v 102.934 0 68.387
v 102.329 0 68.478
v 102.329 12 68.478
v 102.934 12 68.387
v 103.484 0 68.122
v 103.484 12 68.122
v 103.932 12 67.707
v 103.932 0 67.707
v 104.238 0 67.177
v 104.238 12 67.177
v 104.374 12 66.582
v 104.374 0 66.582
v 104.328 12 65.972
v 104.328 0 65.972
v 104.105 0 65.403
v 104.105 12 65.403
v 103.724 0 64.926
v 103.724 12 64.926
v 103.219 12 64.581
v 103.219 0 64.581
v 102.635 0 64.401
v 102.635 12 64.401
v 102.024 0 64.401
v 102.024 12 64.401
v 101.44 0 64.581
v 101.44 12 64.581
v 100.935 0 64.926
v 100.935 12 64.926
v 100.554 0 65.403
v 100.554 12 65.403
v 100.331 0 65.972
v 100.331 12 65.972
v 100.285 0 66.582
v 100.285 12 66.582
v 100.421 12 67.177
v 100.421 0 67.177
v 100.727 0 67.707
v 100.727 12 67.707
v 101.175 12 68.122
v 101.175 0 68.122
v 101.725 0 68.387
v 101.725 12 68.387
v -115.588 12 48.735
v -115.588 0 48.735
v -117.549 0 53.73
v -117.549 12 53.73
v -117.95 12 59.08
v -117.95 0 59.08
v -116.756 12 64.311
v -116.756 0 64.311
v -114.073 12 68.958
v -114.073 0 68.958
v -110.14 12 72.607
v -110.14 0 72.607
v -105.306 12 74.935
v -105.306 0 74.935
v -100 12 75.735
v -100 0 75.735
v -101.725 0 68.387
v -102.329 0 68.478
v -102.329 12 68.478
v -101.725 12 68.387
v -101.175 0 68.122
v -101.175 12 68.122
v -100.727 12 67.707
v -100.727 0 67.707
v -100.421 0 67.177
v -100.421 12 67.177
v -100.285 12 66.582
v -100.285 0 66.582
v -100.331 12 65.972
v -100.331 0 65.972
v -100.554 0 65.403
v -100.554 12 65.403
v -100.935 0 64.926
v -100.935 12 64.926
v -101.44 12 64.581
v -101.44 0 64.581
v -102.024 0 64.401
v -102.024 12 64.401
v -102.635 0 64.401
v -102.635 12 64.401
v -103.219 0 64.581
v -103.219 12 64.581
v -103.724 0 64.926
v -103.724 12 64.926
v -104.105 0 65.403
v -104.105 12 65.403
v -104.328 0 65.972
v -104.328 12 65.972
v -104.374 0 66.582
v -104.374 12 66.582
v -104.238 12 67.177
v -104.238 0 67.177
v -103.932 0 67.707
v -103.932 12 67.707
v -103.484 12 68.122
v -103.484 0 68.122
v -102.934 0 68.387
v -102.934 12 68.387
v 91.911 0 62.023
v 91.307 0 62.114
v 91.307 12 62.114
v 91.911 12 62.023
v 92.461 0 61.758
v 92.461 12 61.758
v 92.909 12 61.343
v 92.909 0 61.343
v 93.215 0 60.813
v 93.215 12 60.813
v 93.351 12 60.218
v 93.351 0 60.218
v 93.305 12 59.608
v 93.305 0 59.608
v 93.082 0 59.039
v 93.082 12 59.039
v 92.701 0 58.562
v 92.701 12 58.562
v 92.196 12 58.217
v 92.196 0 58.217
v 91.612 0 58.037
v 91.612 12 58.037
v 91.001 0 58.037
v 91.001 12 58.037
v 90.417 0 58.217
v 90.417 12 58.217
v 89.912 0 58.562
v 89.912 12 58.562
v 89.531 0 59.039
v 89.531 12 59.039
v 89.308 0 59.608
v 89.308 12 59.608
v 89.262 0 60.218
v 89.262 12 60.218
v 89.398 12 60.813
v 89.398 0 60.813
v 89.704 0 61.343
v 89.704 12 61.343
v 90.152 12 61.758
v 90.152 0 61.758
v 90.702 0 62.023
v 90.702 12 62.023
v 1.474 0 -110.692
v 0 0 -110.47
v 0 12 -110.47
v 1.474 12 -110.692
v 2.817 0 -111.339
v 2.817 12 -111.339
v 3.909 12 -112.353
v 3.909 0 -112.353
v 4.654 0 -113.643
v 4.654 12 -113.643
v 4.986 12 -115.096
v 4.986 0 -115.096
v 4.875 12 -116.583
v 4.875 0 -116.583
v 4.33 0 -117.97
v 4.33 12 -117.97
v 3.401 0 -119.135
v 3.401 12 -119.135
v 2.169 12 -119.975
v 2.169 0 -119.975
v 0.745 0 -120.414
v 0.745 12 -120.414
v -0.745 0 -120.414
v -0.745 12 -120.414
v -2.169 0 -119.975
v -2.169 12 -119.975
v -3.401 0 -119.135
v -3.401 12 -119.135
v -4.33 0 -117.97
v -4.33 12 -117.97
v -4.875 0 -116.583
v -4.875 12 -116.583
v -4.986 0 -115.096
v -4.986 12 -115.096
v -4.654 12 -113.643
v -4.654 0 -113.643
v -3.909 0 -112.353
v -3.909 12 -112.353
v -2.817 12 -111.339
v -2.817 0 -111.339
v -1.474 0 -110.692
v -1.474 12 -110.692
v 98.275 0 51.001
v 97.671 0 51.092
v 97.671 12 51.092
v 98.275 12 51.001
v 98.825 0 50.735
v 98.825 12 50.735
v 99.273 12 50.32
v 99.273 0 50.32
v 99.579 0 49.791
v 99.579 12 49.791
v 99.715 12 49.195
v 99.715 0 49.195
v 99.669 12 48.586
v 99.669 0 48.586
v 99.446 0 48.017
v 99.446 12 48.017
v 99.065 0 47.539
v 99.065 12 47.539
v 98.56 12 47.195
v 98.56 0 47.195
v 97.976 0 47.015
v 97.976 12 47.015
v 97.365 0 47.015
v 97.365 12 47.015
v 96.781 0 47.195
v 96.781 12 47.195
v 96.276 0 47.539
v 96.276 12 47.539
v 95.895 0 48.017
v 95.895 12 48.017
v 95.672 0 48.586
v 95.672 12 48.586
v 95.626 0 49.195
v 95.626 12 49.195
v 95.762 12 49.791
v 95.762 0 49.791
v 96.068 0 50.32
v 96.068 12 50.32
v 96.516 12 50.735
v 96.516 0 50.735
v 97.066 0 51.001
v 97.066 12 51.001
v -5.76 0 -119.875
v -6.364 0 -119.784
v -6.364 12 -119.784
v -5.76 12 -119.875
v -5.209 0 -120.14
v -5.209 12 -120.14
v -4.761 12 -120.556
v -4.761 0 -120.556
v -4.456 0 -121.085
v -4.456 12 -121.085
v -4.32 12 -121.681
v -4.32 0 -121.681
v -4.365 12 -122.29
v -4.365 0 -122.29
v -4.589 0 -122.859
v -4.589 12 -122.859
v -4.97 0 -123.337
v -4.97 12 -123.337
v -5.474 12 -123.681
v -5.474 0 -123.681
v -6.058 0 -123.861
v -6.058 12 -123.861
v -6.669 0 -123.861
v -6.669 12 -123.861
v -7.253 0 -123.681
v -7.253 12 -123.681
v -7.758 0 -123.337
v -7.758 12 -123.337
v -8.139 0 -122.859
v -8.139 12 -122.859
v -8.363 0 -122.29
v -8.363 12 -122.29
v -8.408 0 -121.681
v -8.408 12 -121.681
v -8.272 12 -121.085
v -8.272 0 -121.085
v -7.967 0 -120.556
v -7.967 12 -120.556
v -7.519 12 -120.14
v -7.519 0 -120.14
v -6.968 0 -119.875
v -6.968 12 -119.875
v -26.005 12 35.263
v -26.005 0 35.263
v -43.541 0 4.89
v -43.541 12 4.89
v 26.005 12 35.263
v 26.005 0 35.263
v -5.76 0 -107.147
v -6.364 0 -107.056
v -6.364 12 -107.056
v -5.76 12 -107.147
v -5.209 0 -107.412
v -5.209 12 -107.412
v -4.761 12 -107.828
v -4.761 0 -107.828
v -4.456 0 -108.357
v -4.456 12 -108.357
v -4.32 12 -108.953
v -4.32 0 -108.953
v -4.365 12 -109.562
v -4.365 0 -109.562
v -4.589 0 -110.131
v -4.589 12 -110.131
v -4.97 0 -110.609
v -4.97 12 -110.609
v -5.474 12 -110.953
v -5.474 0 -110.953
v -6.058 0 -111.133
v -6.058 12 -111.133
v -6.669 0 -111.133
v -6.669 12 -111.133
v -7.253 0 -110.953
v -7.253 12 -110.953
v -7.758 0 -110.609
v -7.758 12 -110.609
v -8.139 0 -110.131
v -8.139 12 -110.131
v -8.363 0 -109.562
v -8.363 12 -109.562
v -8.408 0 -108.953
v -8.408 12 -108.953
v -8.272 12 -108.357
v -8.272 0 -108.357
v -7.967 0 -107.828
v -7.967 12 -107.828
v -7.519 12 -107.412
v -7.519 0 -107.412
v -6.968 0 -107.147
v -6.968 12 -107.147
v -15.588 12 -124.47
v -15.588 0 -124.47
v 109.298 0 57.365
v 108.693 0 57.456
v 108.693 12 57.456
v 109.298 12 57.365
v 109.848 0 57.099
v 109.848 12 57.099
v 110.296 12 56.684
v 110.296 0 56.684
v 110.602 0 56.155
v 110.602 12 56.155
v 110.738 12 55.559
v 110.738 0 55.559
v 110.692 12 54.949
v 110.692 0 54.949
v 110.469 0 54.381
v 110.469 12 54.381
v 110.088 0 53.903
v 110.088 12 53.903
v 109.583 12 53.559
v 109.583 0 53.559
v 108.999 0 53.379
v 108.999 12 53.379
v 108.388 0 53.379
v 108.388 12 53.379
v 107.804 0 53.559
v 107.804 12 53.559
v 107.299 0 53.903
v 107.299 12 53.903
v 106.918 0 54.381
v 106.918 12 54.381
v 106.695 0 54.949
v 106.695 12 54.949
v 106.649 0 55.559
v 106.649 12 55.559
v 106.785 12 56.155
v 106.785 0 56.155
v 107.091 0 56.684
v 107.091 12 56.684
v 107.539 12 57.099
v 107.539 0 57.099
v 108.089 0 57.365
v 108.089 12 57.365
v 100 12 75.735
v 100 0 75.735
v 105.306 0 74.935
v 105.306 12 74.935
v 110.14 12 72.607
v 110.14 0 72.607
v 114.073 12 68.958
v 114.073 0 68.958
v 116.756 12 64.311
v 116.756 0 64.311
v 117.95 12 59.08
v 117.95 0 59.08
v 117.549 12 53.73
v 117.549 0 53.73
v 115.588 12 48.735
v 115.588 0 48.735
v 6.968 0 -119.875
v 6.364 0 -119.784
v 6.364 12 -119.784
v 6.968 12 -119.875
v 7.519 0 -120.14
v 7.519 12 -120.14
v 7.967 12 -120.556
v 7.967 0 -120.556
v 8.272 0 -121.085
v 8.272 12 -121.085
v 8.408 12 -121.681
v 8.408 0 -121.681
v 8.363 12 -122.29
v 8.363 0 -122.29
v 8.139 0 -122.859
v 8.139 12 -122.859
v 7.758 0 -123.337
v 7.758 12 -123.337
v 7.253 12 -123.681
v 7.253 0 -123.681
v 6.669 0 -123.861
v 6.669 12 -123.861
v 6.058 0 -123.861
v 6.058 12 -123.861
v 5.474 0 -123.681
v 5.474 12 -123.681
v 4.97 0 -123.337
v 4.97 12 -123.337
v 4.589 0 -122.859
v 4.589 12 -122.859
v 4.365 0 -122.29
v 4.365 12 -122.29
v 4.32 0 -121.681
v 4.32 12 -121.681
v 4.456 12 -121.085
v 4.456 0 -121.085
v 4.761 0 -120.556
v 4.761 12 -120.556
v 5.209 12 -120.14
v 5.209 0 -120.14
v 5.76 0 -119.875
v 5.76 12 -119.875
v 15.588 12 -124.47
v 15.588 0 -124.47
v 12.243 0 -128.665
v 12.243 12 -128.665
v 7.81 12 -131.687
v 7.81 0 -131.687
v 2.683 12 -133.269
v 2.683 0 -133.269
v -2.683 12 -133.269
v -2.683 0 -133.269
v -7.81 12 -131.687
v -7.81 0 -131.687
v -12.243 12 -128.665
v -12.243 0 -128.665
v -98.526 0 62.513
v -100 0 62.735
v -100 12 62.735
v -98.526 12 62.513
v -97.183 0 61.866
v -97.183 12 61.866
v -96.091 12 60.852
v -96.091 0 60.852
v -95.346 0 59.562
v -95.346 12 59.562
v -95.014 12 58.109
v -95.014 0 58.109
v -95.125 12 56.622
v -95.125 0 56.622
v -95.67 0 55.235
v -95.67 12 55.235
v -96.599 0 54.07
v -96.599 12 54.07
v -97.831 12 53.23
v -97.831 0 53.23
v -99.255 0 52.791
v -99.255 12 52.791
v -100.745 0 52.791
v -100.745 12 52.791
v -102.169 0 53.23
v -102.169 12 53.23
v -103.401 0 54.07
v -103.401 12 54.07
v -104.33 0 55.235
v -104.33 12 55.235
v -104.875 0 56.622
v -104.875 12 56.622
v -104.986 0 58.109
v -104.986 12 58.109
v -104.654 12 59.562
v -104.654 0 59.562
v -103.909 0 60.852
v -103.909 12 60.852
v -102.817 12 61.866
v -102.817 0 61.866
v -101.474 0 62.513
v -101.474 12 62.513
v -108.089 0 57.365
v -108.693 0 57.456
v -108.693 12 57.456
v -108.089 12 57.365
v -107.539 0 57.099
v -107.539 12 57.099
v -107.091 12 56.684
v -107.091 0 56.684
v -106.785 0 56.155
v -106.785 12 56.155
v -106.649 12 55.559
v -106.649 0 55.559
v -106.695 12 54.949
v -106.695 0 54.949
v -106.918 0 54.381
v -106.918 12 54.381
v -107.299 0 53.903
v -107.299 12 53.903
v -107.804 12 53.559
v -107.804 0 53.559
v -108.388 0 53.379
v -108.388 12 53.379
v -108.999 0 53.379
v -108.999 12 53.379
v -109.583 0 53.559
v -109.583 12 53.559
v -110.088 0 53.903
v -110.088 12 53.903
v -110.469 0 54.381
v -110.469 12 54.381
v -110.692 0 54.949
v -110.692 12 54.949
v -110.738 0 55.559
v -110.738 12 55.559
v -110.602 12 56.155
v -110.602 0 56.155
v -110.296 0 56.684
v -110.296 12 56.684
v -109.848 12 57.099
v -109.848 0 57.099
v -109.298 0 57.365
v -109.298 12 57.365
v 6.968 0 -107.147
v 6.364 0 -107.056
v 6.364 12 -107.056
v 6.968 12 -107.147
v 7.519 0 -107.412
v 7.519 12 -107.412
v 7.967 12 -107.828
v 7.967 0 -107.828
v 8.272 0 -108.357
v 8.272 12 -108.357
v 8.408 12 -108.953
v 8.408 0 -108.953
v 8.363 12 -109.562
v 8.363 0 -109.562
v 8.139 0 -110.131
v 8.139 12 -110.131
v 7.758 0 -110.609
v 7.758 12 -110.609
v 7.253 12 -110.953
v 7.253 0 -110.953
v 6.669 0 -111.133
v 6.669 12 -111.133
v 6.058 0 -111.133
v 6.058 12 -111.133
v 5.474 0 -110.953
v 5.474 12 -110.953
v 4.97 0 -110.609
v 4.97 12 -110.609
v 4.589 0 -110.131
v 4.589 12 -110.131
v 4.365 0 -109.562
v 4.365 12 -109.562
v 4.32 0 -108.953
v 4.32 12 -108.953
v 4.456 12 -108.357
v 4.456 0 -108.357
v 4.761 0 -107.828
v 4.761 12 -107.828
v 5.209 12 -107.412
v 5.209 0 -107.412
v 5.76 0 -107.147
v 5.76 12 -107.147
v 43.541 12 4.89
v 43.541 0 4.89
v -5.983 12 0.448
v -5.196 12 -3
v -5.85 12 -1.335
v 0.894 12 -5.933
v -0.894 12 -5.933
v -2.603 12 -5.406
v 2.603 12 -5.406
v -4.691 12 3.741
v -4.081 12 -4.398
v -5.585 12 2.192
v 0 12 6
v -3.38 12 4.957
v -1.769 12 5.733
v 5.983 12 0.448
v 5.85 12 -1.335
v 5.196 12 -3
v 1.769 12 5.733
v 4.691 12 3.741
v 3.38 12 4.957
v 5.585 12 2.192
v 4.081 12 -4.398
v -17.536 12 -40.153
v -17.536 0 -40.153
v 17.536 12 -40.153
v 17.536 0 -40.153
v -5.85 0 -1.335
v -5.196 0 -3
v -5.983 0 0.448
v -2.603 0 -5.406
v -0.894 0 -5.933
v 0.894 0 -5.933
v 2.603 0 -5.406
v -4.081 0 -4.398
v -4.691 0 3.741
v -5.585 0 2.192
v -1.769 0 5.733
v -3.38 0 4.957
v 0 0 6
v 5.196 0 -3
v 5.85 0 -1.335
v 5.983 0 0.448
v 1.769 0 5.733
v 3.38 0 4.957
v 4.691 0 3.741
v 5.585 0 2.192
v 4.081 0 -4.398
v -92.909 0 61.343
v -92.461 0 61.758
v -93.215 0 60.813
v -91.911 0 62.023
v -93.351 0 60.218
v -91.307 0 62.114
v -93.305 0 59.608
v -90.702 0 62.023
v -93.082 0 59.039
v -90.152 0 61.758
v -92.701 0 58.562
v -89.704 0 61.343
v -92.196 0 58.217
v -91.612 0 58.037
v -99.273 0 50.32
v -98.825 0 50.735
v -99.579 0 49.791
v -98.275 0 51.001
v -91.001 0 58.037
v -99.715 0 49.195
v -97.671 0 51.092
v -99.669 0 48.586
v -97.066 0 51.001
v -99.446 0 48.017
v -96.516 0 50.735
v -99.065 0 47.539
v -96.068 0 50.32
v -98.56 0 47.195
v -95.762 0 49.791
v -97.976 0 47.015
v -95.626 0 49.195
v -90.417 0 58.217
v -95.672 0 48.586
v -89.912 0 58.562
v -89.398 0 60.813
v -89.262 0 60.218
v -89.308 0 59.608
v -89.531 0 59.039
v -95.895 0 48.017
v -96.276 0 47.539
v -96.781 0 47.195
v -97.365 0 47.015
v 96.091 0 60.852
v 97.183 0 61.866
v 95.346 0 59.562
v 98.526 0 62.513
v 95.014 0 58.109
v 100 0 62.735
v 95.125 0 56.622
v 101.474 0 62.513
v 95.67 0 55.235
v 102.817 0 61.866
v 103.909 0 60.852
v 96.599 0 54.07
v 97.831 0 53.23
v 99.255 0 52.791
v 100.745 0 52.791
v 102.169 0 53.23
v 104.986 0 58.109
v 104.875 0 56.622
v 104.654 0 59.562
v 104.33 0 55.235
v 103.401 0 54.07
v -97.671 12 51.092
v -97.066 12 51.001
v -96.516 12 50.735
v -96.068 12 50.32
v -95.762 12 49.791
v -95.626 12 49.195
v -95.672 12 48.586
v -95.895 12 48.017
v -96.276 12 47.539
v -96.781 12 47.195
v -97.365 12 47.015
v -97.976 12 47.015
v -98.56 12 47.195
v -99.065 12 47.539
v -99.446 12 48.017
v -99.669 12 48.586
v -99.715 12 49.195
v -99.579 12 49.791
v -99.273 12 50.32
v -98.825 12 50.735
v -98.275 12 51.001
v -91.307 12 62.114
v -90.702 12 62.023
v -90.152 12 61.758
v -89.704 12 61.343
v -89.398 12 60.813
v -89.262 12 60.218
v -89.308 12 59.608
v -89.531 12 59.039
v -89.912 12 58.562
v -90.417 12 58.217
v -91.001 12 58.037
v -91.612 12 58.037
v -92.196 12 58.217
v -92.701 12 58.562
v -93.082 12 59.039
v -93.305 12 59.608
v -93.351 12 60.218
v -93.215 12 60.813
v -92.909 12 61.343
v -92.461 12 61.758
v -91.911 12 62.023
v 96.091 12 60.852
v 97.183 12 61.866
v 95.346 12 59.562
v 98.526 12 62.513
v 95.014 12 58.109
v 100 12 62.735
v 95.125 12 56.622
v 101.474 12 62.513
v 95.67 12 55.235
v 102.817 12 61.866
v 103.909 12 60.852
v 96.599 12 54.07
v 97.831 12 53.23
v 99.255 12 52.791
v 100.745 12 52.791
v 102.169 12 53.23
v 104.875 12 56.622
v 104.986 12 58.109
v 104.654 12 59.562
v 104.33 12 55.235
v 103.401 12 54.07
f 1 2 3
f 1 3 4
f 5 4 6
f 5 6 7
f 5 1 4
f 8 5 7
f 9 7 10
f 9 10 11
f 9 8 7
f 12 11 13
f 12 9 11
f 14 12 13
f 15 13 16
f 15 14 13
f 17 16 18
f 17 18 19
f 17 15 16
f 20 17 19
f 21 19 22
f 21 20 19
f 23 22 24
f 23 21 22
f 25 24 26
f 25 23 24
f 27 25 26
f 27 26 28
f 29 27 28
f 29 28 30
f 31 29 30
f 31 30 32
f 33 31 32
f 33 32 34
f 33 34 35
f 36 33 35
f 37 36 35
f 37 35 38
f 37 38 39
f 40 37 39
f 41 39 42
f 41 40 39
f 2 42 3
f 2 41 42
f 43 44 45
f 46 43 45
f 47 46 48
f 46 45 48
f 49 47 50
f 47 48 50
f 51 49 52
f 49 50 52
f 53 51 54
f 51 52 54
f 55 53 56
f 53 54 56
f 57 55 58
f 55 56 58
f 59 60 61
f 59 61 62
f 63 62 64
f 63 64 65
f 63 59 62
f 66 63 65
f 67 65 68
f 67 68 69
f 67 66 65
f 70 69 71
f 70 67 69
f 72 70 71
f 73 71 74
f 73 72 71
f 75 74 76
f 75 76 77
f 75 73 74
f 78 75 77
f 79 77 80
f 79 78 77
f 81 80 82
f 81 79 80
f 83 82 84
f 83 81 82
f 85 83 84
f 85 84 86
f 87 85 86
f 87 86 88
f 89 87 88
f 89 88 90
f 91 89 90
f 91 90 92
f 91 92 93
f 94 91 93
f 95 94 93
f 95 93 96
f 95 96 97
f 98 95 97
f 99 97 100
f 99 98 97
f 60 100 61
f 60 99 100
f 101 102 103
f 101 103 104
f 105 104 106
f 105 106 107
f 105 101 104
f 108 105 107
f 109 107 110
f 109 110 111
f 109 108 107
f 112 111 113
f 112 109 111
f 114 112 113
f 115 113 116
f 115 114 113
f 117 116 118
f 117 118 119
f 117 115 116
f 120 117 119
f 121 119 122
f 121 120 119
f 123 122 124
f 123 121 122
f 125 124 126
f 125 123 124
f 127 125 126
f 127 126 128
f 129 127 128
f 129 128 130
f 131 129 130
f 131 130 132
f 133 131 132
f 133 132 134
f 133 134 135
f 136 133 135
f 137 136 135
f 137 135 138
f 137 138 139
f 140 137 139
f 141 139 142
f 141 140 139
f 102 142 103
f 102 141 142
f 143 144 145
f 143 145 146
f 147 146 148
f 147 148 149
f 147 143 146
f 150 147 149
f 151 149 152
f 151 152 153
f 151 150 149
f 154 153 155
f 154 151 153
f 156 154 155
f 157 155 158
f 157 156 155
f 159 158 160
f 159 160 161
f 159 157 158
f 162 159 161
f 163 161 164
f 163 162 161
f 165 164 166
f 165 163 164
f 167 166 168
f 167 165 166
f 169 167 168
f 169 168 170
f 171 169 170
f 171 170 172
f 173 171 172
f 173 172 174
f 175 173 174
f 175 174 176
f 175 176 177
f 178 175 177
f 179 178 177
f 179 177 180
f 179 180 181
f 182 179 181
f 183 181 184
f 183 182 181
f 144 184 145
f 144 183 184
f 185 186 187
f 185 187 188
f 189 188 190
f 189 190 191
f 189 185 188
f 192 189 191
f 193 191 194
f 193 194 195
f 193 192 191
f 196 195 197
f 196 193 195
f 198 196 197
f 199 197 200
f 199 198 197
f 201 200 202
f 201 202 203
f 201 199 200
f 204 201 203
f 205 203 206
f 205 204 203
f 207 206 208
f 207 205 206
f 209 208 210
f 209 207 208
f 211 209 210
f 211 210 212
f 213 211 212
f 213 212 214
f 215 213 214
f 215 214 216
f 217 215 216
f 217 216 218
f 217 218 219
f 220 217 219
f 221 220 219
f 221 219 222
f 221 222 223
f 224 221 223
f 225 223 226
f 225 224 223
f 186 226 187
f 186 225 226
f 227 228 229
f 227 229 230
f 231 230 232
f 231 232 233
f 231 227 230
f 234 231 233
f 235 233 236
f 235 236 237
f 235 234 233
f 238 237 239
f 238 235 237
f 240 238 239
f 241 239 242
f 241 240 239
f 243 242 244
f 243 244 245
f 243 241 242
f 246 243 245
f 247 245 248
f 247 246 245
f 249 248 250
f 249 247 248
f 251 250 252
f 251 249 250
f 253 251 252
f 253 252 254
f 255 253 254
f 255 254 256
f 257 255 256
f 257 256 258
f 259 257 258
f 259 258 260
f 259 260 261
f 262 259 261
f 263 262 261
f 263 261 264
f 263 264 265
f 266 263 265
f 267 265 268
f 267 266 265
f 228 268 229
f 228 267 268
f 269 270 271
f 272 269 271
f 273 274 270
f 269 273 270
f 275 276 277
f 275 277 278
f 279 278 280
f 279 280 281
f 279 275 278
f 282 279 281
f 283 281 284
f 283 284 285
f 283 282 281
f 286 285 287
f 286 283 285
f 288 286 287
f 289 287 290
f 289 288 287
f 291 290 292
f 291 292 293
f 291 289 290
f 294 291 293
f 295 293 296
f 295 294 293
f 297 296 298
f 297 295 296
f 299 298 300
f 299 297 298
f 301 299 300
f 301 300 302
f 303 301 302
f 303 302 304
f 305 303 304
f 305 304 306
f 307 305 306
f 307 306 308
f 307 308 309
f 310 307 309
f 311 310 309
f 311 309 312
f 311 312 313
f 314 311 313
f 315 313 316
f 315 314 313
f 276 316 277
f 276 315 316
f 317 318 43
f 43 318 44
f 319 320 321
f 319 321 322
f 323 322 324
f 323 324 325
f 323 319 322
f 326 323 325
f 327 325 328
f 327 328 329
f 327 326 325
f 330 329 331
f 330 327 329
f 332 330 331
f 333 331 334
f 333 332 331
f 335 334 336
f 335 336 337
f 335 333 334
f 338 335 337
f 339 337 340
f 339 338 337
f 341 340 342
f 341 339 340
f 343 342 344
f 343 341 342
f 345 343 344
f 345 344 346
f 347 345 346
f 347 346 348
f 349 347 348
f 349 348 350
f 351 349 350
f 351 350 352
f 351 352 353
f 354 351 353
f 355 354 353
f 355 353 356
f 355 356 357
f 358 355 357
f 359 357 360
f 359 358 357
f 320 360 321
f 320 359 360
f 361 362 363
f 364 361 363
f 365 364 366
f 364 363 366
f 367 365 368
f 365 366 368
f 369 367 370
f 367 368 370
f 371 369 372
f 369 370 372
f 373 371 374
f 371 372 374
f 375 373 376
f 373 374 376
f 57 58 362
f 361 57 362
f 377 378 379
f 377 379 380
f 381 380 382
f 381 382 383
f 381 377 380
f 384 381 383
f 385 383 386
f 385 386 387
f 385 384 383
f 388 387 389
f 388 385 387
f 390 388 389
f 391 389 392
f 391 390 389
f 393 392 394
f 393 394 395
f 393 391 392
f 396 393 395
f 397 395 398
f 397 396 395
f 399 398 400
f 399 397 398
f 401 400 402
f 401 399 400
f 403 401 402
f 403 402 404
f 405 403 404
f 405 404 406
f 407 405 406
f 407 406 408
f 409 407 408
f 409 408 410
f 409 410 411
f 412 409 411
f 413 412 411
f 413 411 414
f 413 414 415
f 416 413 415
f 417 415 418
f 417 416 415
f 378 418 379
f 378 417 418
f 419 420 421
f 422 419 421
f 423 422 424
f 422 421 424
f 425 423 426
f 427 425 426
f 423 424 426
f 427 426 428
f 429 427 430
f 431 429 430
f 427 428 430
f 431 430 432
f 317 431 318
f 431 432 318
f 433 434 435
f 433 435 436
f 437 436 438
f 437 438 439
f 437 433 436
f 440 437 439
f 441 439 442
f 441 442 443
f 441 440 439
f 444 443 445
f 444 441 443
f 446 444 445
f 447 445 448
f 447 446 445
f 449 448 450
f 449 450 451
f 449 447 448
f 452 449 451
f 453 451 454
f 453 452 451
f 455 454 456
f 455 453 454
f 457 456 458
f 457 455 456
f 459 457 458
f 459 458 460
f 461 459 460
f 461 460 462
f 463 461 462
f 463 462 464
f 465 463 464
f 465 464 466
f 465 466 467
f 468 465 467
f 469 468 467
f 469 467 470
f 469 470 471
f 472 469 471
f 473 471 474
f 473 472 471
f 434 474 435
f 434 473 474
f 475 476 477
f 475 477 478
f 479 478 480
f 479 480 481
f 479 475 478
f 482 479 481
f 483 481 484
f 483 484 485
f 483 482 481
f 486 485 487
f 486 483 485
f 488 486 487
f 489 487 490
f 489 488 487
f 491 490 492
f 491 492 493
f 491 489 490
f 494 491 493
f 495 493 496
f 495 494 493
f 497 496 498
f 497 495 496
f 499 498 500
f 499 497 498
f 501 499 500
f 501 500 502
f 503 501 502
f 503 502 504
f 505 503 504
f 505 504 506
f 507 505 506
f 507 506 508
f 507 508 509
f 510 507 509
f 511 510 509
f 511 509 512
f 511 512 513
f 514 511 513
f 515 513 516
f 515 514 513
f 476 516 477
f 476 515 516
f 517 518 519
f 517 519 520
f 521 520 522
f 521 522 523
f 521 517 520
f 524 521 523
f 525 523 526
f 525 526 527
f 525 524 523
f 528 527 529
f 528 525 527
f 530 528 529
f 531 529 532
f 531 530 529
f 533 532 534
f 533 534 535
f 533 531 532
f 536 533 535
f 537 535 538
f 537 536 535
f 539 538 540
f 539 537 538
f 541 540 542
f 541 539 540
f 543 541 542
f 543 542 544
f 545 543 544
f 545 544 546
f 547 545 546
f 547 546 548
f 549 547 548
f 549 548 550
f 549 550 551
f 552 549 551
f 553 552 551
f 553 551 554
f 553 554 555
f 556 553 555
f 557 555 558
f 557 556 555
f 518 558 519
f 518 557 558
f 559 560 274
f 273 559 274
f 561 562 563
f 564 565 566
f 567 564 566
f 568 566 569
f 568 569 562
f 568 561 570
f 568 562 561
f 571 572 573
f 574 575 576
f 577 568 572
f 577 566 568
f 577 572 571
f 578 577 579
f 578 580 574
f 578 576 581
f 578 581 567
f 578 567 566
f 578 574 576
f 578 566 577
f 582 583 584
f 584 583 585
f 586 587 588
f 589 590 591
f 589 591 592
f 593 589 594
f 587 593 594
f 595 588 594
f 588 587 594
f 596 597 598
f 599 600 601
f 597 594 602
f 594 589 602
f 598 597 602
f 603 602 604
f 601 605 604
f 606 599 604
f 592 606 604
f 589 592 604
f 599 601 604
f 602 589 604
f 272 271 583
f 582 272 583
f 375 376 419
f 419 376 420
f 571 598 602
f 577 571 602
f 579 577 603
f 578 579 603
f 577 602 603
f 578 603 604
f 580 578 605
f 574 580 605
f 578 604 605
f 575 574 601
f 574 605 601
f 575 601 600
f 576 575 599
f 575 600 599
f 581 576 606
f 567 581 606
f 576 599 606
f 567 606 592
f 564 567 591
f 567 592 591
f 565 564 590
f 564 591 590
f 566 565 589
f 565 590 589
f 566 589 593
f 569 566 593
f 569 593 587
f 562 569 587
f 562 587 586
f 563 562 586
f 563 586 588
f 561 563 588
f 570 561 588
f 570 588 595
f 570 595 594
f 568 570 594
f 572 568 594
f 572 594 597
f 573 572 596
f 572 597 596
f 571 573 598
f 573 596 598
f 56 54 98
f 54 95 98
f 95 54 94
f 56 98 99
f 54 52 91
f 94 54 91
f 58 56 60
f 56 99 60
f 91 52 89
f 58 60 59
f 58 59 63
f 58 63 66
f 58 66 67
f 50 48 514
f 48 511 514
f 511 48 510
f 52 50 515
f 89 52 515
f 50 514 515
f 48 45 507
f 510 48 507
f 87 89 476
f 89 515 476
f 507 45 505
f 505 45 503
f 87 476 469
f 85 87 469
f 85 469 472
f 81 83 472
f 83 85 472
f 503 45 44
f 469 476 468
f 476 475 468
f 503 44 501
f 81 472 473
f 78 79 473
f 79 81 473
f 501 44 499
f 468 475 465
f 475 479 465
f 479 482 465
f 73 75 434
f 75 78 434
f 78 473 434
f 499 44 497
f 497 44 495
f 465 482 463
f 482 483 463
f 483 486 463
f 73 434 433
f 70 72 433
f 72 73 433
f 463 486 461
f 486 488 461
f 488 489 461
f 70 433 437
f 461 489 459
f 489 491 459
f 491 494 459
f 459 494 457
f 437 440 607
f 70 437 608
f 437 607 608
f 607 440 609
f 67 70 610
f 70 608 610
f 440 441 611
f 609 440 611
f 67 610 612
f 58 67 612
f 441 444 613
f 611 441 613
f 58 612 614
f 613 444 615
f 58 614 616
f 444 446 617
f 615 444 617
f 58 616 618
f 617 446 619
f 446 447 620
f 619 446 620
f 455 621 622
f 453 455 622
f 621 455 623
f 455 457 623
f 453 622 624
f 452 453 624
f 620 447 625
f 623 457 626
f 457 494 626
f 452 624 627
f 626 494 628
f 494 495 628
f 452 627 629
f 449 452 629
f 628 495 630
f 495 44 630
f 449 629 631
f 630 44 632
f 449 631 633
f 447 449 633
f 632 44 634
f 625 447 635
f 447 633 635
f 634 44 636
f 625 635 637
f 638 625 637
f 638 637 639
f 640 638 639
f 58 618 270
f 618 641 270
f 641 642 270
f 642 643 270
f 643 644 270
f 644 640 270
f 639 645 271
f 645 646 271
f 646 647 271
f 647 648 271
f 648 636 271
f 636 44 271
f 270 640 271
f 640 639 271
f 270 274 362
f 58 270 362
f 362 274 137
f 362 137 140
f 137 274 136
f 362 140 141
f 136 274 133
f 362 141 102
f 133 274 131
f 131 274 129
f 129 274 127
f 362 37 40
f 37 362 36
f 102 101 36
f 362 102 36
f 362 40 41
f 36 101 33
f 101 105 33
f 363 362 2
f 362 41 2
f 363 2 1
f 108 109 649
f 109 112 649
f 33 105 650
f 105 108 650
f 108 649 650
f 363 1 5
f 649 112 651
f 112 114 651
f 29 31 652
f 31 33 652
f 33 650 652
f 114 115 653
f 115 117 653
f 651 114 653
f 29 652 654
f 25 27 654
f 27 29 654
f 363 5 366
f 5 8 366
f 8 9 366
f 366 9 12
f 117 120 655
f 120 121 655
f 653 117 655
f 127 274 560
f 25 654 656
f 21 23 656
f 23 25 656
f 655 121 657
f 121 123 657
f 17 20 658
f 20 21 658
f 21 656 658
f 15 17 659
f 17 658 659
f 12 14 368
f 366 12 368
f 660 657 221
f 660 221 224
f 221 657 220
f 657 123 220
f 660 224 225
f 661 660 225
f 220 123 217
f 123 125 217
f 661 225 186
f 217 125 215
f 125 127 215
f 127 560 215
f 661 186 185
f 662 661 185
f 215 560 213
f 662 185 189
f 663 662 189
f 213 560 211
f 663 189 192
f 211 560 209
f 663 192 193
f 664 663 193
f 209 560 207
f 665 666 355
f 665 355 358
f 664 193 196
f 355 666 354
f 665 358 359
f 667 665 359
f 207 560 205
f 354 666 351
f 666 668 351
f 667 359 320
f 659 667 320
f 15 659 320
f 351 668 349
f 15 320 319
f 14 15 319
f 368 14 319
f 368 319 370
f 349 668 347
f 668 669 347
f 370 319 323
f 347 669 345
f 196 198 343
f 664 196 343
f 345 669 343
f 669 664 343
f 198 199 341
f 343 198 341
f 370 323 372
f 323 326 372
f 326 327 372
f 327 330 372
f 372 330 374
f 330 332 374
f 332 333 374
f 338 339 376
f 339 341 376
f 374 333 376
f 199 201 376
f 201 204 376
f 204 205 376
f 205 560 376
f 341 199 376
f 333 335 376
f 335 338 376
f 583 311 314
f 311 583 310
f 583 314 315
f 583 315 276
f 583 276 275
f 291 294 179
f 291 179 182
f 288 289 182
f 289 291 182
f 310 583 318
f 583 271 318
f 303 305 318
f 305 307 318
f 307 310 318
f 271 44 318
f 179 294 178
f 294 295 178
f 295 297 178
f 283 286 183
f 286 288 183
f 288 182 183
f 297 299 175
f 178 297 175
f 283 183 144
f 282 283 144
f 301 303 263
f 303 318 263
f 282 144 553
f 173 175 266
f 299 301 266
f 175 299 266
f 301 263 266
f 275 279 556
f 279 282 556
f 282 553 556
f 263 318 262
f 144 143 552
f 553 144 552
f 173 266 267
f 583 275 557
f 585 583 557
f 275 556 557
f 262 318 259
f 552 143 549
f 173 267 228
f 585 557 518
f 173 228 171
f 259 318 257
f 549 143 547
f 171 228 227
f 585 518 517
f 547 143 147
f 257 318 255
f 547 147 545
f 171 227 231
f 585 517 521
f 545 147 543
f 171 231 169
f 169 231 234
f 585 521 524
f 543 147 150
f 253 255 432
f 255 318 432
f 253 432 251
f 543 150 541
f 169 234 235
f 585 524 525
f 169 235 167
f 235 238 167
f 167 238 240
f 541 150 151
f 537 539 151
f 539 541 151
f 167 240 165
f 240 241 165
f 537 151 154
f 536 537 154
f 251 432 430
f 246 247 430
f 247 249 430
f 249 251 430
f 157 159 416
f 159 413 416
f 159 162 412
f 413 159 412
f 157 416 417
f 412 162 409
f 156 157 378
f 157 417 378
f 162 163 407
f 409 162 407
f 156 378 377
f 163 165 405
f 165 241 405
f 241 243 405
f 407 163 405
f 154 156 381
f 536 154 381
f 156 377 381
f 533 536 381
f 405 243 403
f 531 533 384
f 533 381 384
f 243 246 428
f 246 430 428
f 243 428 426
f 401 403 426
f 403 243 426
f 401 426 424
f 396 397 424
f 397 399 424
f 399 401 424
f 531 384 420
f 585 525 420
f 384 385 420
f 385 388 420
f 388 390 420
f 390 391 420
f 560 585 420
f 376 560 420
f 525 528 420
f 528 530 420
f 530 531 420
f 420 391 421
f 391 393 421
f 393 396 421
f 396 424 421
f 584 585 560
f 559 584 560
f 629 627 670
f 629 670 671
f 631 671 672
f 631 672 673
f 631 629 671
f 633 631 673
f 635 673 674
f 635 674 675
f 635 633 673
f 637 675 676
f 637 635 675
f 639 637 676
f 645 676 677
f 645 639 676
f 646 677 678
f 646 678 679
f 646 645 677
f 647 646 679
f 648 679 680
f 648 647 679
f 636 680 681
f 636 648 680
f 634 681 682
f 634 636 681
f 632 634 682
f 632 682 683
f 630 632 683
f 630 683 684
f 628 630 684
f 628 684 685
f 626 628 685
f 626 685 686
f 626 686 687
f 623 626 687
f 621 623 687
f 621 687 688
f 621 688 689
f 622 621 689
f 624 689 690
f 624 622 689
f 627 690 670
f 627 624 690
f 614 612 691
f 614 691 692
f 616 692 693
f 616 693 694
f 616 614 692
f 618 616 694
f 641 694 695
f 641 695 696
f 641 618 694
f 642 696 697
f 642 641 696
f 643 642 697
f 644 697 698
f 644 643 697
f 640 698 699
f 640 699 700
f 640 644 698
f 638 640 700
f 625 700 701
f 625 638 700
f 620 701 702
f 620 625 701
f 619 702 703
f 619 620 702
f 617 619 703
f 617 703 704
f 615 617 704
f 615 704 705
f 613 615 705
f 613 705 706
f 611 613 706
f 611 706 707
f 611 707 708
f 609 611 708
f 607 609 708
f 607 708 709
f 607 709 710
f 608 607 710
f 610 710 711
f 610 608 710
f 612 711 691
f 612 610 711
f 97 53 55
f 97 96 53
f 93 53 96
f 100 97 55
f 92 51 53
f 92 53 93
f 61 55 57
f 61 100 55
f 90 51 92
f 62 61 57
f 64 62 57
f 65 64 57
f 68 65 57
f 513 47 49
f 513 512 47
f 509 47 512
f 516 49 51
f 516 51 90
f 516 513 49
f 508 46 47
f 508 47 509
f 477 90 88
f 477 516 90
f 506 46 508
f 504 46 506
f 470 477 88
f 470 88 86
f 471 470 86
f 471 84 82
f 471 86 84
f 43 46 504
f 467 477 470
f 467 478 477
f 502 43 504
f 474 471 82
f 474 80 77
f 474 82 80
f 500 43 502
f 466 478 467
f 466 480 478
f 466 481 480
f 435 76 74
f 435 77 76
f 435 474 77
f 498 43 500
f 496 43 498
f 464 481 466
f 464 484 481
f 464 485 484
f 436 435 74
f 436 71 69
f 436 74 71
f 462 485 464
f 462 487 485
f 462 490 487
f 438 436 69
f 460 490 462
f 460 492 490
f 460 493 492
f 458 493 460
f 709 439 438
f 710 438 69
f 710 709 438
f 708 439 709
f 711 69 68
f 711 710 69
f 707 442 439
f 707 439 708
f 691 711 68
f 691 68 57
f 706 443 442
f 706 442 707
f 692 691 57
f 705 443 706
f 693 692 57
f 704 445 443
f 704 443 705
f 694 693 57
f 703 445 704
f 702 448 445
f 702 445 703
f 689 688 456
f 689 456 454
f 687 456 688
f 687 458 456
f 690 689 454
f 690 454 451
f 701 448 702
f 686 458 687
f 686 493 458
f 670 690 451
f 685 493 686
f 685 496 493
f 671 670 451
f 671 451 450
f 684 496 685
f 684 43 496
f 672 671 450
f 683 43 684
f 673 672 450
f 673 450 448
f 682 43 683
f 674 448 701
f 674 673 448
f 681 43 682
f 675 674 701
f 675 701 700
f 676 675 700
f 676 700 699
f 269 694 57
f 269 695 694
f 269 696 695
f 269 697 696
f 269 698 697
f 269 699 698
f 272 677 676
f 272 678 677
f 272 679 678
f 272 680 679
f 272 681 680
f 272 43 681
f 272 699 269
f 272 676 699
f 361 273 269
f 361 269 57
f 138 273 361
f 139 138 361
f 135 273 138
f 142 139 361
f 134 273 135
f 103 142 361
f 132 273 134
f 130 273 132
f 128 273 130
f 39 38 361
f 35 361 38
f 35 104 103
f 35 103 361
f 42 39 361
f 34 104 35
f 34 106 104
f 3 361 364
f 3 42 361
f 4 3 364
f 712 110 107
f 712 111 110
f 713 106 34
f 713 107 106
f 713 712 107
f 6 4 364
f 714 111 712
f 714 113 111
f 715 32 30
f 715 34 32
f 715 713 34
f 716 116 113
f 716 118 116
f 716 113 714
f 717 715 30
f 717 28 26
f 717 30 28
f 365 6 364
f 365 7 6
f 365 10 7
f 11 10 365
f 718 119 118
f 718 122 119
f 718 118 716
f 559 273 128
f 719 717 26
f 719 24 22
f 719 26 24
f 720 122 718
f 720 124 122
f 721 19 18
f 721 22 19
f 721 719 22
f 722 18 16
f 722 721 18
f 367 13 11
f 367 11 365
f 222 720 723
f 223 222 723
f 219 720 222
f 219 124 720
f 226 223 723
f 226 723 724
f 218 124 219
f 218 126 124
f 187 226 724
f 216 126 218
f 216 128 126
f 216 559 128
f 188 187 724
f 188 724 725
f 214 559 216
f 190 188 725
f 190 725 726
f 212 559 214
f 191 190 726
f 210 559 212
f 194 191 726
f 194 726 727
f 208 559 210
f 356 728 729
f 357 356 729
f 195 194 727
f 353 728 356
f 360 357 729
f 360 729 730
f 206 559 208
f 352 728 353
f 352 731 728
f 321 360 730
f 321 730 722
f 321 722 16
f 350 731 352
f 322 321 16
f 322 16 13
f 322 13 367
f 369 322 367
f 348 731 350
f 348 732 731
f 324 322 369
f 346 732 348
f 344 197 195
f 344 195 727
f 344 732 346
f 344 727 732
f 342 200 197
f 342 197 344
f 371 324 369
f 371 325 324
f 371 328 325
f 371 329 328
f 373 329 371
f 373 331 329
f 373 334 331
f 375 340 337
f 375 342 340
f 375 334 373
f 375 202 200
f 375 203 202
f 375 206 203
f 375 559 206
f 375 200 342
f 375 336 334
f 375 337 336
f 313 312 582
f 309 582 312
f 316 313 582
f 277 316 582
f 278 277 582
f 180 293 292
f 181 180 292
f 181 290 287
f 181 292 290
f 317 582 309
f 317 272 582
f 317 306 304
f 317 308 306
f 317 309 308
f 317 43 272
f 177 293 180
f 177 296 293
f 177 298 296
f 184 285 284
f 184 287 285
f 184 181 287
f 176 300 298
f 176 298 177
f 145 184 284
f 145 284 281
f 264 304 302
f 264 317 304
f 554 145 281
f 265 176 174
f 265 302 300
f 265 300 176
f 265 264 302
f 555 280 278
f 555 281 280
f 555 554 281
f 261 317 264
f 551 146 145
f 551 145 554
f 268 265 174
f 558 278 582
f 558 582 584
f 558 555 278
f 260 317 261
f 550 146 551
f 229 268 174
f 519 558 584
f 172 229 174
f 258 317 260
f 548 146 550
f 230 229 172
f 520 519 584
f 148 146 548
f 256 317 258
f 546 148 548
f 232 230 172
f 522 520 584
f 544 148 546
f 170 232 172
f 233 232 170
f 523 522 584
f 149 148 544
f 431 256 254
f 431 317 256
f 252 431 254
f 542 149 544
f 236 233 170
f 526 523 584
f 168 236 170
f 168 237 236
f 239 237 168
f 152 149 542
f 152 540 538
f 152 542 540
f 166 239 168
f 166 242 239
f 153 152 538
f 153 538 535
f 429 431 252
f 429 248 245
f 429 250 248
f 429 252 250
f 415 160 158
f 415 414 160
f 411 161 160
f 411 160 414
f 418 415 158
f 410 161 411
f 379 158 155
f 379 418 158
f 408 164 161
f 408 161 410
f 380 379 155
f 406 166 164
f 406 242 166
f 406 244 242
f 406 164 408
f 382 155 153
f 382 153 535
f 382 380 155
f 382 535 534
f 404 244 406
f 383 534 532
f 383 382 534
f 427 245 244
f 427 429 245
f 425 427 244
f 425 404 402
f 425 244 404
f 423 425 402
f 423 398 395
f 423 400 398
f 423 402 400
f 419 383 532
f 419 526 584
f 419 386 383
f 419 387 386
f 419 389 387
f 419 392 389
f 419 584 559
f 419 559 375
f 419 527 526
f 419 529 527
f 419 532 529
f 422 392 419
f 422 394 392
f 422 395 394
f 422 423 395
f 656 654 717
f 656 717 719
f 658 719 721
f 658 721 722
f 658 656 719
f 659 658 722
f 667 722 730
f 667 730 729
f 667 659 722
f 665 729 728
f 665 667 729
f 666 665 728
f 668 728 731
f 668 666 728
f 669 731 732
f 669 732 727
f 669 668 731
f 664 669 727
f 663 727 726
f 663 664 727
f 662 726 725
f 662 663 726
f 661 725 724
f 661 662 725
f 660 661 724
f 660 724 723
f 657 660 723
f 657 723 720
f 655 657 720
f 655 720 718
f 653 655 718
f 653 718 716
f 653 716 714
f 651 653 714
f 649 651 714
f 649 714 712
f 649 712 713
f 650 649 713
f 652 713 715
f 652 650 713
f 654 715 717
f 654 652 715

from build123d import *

# Parameters (mm, degrees)
SKETCH1_R             = 6
BOSS_EXTRUDE1_DEPTH   = 12
SKETCH1_R_2           = 5
SKETCH1_R_3           = 2.05
BOSS_EXTRUDE1_2_DEPTH = 12


with BuildPart() as part:
    # Sketch1 → Boss-Extrude1 (new body)
    with BuildSketch(Plane(origin=(0, 0, 0), x_dir=(1, 0, 0), z_dir=(0, 1, 0))):
        with Locations(Location((0, 0, 0), (0, 0, 270))):
            Circle(SKETCH1_R)
    extrude(amount=BOSS_EXTRUDE1_DEPTH)


with BuildPart() as body_2:
    # Sketch1 → Boss-Extrude1 2 (new body)
    with BuildSketch(Plane(origin=(0, 0, 0), x_dir=(1, 0, 0), z_dir=(0, 1, 0))):
        with BuildLine():
            Line((-15.588457268, 124.470053838), (-115.588457268, -48.735026919))
            ThreePointArc((-115.588457268, -48.735026919), (-115.588457268, -66.735026919), (-100, -75.735026919))
            Line((-100, -75.735026919), (100, -75.735026919))
            ThreePointArc((100, -75.735026919), (115.588457268, -66.735026919), (115.588457268, -48.735026919))
            Line((115.588457268, -48.735026919), (15.588457268, 124.470053838))
            ThreePointArc((15.588457268, 124.470053838), (0, 133.470053838), (-15.588457268, 124.470053838))
        make_face()
        with Locations(Location((0, 115.470053838, 0), (0, 0, 270))):
            Circle(SKETCH1_R_2, mode=Mode.SUBTRACT)
        with Locations(Location((-6.363961031, 121.834014869, 0), (0, 0, 270))):
            Circle(SKETCH1_R_3, mode=Mode.SUBTRACT)
        with Locations(Location((-6.363961031, 109.106092807, 0), (0, 0, 270))):
            Circle(SKETCH1_R_3, mode=Mode.SUBTRACT)
        with Locations(Location((6.363961031, 109.106092807, 0), (0, 0, 270))):
            Circle(SKETCH1_R_3, mode=Mode.SUBTRACT)
        with Locations(Location((6.363961031, 121.834014869, 0), (0, 0, 270))):
            Circle(SKETCH1_R_3, mode=Mode.SUBTRACT)
        with Locations(Location((100, -57.735026919, 0), (0, 0, 270))):
            Circle(SKETCH1_R_2, mode=Mode.SUBTRACT)
        with Locations(Location((-100, -57.735026919, 0), (0, 0, 270))):
            Circle(SKETCH1_R_2, mode=Mode.SUBTRACT)
        with Locations(Location((91.306667563, -60.064398325, 0), (0, 0, 270))):
            Circle(SKETCH1_R_3, mode=Mode.SUBTRACT)
        with Locations(Location((102.329371406, -66.428359356, 0), (0, 0, 270))):
            Circle(SKETCH1_R_3, mode=Mode.SUBTRACT)
        with Locations(Location((108.693332437, -55.405655513, 0), (0, 0, 270))):
            Circle(SKETCH1_R_3, mode=Mode.SUBTRACT)
        with Locations(Location((97.670628594, -49.041694482, 0), (0, 0, 270))):
            Circle(SKETCH1_R_3, mode=Mode.SUBTRACT)
        with Locations(Location((-108.693332437, -55.405655513, 0), (0, 0, 270))):
            Circle(SKETCH1_R_3, mode=Mode.SUBTRACT)
        with Locations(Location((-102.329371406, -66.428359356, 0), (0, 0, 270))):
            Circle(SKETCH1_R_3, mode=Mode.SUBTRACT)
        with Locations(Location((-91.306667563, -60.064398325, 0), (0, 0, 270))):
            Circle(SKETCH1_R_3, mode=Mode.SUBTRACT)
        with Locations(Location((-97.670628594, -49.041694482, 0), (0, 0, 270))):
            Circle(SKETCH1_R_3, mode=Mode.SUBTRACT)
        Polygon((-17.536180574, 40.152844192), (17.536180574, 40.152844192), (43.541473392, -4.889644233), (26.005292817, -35.263199959), (-26.005292817, -35.263199959), (-43.541473392, -4.889644233), align=None, mode=Mode.SUBTRACT)
    extrude(amount=BOSS_EXTRUDE1_2_DEPTH)


solid = Compound([part.part, body_2.part])
